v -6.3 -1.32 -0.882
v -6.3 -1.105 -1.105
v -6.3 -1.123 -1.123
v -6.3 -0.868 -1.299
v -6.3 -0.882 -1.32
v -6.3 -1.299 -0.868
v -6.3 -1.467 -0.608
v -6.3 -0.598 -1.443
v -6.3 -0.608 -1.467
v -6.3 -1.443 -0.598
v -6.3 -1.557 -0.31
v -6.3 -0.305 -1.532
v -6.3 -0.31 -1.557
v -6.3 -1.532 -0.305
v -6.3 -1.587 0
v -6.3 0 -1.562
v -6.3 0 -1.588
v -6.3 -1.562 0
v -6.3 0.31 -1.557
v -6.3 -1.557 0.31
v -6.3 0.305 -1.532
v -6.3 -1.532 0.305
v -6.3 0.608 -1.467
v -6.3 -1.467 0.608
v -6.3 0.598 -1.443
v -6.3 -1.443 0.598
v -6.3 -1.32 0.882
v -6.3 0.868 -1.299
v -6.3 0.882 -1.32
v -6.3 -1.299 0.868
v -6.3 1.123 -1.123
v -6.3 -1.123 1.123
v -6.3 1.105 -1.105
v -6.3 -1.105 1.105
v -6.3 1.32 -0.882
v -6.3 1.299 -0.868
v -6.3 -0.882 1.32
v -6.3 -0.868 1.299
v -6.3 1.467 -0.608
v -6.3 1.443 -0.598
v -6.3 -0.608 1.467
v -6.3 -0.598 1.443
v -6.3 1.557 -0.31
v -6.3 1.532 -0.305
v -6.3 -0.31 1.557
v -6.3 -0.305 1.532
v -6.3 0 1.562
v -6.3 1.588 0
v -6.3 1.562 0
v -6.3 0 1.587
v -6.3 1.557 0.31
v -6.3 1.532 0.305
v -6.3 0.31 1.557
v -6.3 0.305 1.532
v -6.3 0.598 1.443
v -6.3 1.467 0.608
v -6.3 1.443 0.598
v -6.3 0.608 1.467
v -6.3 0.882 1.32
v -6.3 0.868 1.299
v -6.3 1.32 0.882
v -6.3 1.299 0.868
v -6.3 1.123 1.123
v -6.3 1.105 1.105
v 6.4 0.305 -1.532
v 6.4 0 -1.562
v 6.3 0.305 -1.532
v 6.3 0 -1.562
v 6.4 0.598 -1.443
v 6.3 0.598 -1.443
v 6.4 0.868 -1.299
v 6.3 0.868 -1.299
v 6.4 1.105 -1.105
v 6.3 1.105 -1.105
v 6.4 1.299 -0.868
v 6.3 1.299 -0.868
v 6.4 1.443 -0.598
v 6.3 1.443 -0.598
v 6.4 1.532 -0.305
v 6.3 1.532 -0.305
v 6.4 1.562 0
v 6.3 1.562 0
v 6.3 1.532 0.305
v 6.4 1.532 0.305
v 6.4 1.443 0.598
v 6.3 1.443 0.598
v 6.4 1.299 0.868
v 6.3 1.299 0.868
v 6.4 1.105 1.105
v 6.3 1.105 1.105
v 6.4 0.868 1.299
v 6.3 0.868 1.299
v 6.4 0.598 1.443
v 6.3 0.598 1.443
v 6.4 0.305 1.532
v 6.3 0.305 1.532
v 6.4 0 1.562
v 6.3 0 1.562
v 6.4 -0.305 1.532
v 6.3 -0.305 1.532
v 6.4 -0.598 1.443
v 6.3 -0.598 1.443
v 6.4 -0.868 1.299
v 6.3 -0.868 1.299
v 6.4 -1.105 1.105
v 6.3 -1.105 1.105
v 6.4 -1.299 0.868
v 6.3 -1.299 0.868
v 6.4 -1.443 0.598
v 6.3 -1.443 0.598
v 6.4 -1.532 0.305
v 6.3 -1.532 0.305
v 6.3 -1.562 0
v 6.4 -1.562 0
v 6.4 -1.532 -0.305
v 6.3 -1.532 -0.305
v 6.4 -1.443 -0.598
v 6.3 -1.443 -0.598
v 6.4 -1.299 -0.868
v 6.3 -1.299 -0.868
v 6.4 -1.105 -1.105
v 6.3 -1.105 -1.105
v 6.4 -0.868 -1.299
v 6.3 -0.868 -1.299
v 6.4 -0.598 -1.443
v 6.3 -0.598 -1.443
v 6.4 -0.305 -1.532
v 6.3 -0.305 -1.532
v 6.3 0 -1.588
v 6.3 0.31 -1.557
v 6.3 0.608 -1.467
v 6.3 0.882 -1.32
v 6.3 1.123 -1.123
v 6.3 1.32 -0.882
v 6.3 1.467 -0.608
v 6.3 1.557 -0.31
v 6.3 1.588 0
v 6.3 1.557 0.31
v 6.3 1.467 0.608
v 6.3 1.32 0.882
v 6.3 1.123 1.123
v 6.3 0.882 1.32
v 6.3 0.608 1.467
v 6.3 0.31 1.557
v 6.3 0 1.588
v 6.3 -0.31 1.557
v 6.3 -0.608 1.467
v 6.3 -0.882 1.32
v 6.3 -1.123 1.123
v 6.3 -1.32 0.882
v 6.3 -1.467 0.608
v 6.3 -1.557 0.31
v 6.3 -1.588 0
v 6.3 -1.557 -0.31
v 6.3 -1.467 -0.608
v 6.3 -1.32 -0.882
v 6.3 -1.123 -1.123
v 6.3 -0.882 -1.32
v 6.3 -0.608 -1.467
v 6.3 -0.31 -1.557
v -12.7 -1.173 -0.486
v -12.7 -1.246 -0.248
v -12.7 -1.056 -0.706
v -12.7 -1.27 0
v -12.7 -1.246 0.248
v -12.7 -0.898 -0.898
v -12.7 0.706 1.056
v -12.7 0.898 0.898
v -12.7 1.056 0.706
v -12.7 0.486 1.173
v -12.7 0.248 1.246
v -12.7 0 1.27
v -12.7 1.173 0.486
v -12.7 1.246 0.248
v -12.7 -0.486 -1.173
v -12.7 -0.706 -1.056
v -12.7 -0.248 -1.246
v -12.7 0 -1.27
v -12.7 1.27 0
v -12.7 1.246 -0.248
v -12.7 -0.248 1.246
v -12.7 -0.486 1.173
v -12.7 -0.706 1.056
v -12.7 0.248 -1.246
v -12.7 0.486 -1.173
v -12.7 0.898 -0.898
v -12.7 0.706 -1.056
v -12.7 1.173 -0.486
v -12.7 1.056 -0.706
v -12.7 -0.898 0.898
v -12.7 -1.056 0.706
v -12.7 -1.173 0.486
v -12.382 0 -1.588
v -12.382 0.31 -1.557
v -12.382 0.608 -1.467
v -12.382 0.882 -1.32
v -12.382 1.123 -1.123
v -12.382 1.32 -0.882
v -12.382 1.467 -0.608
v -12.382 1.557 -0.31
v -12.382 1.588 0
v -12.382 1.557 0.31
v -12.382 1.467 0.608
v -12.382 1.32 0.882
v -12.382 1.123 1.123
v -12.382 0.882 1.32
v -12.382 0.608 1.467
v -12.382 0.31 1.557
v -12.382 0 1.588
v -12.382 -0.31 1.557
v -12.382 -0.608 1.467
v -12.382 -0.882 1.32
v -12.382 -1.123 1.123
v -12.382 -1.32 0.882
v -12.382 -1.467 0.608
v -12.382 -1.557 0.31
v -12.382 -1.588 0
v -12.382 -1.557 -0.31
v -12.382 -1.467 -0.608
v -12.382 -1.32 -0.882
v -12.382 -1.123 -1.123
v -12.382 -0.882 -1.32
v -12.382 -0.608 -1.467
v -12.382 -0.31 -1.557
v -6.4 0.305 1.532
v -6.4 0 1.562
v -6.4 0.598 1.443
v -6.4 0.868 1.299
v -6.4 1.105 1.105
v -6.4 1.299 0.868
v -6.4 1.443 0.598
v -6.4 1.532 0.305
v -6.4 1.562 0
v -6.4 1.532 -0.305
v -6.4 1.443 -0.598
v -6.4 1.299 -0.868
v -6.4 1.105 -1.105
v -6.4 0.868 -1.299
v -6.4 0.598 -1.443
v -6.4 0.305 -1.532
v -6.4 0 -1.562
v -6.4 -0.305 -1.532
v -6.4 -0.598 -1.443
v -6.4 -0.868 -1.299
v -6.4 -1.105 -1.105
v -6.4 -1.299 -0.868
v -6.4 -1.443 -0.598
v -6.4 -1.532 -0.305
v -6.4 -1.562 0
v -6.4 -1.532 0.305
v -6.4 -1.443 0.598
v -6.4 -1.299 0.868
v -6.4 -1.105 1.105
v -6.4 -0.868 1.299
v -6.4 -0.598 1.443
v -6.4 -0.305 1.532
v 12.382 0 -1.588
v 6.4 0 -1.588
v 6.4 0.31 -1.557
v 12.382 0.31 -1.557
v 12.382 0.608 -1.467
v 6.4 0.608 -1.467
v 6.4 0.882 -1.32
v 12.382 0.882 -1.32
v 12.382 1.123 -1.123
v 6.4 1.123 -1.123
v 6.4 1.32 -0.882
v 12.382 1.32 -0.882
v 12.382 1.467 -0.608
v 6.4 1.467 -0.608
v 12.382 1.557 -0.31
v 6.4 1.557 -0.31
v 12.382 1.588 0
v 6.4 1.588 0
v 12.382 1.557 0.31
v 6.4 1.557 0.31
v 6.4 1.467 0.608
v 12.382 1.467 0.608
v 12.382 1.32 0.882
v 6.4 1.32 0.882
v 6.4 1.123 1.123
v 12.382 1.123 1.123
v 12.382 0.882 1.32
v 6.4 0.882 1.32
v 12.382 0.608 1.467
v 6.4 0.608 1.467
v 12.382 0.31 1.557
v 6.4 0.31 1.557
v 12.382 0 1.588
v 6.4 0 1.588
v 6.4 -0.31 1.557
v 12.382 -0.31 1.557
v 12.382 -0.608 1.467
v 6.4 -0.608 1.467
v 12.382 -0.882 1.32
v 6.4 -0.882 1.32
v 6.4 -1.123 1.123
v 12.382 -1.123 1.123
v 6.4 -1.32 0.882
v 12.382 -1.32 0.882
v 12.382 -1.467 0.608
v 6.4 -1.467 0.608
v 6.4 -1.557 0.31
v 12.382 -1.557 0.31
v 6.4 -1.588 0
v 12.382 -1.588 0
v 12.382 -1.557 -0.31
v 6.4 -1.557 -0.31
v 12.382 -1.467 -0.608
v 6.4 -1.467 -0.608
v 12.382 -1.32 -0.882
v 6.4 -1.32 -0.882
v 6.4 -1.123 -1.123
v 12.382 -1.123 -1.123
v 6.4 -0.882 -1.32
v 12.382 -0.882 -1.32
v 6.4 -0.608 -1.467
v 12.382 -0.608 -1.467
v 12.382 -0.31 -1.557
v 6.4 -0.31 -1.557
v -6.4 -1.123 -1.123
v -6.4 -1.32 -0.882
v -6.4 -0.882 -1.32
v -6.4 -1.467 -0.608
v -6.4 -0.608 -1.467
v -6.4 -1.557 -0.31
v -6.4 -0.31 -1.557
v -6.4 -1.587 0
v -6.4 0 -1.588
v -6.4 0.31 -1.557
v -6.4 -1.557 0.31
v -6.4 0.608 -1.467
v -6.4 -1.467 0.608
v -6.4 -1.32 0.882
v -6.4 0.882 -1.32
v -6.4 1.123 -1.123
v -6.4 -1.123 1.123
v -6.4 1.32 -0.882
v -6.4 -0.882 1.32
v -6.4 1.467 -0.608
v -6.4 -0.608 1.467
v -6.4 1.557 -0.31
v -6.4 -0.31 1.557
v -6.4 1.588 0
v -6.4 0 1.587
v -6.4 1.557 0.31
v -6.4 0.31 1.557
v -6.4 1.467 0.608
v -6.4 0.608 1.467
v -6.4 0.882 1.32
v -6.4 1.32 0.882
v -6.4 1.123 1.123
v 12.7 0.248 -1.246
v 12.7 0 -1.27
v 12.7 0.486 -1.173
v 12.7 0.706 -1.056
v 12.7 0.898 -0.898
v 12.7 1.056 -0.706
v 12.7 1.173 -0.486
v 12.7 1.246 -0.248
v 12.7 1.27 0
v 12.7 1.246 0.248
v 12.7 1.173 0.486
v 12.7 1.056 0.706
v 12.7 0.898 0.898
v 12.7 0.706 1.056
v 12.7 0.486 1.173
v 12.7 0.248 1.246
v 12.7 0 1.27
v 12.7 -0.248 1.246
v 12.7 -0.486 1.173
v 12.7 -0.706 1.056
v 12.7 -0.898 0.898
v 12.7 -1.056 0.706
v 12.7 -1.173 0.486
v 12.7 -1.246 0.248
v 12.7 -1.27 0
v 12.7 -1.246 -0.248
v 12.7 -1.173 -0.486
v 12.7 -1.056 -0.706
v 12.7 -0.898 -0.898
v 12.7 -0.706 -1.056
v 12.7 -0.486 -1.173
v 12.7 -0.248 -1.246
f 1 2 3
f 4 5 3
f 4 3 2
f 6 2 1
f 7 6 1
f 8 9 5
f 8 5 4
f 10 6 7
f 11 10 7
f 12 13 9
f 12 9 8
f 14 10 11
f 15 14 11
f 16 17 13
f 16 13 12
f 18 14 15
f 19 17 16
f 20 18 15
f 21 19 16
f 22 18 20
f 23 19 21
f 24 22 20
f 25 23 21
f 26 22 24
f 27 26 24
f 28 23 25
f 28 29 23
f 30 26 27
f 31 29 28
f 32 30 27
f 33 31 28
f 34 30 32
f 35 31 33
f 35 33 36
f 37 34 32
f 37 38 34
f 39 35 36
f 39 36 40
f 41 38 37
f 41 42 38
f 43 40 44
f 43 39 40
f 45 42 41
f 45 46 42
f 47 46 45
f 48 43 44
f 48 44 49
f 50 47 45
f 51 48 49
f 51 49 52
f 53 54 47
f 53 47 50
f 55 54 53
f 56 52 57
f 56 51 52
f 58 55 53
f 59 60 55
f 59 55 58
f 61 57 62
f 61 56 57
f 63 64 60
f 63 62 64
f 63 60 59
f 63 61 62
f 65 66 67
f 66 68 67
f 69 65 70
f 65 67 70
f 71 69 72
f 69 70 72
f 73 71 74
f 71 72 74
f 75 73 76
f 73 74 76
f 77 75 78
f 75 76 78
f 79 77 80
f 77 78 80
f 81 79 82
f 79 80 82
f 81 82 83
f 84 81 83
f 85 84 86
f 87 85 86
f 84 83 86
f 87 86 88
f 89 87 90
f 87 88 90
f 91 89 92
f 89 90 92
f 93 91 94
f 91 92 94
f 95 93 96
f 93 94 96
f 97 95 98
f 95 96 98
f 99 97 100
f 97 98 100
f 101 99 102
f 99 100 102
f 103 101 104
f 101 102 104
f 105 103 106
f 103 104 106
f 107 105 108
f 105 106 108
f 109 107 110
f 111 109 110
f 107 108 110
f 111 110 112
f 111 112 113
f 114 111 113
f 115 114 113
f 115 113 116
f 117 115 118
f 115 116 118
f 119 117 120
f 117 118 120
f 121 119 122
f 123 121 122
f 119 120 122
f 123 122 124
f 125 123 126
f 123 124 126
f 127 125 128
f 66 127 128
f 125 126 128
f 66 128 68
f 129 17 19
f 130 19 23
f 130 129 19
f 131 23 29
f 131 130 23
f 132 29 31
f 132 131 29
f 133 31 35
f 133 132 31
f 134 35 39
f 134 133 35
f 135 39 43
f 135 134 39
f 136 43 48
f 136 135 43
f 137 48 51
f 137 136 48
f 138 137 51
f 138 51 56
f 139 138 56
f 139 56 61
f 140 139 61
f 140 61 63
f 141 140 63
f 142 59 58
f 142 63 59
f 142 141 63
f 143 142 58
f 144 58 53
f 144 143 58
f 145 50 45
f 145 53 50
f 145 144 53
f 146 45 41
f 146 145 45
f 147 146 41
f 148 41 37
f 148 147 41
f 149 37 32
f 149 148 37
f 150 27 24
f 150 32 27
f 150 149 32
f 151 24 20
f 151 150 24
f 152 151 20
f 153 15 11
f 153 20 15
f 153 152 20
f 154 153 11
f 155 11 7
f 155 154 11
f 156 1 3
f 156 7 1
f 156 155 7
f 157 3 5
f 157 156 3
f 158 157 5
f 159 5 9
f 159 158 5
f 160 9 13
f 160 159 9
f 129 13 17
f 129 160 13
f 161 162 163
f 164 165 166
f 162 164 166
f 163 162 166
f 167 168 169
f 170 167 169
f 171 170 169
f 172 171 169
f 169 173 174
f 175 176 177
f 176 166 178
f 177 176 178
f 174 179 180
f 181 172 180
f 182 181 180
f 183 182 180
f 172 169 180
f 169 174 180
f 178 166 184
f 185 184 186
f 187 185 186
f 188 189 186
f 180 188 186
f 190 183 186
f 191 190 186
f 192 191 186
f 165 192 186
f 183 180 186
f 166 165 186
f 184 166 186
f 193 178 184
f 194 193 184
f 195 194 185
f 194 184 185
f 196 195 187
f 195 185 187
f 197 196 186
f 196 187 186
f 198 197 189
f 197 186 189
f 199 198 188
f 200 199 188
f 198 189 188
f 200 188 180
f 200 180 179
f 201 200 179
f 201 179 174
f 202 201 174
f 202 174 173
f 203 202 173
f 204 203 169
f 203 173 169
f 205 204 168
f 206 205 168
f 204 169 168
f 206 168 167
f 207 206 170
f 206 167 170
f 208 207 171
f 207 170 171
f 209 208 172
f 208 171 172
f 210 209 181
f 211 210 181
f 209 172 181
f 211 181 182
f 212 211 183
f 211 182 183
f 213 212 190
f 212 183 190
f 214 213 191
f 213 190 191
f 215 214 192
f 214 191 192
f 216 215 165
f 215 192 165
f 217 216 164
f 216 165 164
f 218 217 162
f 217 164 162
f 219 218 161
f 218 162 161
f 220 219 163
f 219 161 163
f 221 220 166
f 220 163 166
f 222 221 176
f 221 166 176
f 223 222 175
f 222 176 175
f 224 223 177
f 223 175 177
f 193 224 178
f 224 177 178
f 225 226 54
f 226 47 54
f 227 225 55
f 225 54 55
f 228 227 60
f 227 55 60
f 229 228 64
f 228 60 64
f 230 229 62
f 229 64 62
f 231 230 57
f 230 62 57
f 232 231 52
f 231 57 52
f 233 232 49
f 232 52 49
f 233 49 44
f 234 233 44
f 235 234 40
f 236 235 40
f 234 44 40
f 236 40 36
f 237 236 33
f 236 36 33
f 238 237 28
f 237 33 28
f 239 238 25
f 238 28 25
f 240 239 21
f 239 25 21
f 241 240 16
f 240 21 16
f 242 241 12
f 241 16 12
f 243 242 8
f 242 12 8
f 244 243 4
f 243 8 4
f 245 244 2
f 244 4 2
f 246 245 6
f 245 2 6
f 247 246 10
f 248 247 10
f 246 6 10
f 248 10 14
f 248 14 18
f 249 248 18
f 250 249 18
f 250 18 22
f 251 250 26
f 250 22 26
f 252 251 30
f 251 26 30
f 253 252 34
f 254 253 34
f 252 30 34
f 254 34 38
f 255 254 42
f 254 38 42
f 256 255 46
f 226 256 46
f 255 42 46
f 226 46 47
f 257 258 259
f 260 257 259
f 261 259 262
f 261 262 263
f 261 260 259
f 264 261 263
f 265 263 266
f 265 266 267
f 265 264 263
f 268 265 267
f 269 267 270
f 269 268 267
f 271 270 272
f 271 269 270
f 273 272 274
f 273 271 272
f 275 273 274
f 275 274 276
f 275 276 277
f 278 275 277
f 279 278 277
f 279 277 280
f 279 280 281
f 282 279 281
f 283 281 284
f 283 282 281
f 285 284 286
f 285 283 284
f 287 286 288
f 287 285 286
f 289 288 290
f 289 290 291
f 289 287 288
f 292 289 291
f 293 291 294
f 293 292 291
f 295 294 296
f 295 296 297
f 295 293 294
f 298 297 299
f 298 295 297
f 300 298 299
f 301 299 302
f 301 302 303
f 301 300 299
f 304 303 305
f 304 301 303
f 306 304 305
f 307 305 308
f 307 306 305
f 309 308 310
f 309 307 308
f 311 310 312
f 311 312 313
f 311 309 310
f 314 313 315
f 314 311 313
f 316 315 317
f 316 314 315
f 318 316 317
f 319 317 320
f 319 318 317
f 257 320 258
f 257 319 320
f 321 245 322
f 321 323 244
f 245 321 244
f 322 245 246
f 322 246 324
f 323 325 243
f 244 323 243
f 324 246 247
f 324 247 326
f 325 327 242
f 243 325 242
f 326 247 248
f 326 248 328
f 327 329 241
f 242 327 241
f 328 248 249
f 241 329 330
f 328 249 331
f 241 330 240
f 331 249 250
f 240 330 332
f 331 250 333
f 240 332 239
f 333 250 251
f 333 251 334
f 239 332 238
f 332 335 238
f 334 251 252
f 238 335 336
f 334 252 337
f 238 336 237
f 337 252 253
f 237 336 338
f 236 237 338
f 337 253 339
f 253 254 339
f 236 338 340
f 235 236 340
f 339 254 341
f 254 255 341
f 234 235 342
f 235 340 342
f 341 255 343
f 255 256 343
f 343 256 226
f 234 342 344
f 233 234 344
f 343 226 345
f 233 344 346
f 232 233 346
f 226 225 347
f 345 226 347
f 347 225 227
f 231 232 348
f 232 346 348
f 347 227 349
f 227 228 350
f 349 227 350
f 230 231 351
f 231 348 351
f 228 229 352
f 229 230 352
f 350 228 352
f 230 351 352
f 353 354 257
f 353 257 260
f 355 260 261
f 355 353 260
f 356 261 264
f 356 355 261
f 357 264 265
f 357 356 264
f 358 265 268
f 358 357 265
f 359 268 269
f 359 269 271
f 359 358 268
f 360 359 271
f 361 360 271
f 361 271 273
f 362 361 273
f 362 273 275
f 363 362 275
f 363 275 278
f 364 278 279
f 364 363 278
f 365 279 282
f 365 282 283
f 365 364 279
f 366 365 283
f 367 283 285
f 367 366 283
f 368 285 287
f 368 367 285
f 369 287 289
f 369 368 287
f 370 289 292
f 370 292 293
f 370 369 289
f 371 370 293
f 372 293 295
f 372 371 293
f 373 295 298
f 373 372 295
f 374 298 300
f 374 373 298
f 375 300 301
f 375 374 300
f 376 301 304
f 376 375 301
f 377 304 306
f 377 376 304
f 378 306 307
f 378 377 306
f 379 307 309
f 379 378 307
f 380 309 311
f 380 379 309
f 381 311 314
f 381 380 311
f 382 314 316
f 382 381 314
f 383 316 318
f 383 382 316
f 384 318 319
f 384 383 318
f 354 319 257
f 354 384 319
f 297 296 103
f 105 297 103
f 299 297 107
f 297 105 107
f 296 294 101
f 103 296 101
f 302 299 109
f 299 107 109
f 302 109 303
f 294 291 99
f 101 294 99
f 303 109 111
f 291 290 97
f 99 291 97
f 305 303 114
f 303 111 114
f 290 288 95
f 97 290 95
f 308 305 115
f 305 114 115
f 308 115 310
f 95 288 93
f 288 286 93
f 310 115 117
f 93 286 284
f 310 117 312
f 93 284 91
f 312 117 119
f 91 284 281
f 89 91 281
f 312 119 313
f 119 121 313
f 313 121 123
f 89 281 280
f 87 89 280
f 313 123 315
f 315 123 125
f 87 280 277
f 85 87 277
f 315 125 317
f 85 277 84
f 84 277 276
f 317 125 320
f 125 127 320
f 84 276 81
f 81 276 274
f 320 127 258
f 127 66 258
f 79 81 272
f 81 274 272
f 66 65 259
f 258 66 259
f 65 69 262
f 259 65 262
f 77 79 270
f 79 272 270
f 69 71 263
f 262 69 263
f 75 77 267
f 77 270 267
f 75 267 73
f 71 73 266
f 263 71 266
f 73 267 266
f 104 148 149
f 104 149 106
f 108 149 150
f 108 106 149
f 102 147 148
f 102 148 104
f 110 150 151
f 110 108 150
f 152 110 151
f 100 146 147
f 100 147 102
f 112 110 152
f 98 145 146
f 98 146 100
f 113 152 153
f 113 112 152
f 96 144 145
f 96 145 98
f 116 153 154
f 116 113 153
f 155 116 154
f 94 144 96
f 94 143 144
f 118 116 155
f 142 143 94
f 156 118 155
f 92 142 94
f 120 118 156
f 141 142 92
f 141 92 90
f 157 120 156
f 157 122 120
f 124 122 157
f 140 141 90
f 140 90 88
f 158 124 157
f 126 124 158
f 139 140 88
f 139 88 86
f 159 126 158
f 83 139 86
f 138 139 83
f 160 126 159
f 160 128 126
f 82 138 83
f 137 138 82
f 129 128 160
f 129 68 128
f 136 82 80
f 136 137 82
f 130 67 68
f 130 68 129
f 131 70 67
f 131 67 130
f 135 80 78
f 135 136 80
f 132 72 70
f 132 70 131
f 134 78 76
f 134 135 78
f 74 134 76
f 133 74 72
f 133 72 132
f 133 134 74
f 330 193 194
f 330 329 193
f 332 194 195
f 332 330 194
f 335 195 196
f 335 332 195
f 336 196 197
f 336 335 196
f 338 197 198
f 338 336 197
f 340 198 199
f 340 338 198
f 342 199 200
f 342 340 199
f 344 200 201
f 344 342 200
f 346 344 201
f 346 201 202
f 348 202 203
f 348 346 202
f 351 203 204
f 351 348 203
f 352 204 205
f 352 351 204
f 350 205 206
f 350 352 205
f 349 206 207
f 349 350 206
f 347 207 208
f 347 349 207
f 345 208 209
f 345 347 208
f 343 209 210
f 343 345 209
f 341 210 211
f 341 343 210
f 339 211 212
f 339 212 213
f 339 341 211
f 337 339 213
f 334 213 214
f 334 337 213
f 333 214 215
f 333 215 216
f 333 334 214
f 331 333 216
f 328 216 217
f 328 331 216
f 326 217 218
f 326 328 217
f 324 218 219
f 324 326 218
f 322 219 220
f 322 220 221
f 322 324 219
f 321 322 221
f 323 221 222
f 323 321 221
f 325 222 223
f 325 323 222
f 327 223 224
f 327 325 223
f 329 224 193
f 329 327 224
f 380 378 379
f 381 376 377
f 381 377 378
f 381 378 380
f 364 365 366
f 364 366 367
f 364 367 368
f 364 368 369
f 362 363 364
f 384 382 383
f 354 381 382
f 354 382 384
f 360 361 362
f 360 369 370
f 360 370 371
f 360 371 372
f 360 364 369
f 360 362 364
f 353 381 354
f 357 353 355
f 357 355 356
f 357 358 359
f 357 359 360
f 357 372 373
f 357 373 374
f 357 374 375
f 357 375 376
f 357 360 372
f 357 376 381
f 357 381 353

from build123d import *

# Parameters (mm, degrees)
SKETCH2_R           = 1.5875
EXTRUDE1_DEPTH      = 12.7
EXTRUDE1_DEPTH_BACK = 12.7
CHAMFER1_SIZE       = 0.3175
SKETCH4_R           = 1.5875
SKETCH4_R_2         = 1.5621
CUT_EXTRUDE2_DEPTH  = 0.05
SKETCH5_R           = 1.5875
SKETCH5_R_2         = 1.5621
CUT_EXTRUDE3_DEPTH  = 0.05


with BuildPart() as part:
    # Sketch2 → Extrude1 (new body, two sides)
    with BuildSketch(Plane(origin=(0, 0, 0), x_dir=(0, 0, -1), z_dir=(1, 0, 0))) as extrude1_sk:
        Circle(SKETCH2_R)
    extrude(amount=EXTRUDE1_DEPTH)
    extrude(extrude1_sk.sketch, amount=-EXTRUDE1_DEPTH_BACK)

    # Chamfer1
    chamfer1_edges = [part.edges().sort_by_distance(p)[0] for p in [
        (-12.7, 0, 1.5875),
        (12.7, 0, 1.5875),
    ]]
    chamfer(chamfer1_edges, length=CHAMFER1_SIZE)

    # Sketch4 → Cut-Extrude2 (cut, symmetric)
    with BuildSketch(Plane.ZY.offset(6.35)):
        Circle(SKETCH4_R)
        Circle(SKETCH4_R_2, mode=Mode.SUBTRACT)
    extrude(amount=CUT_EXTRUDE2_DEPTH, both=True, mode=Mode.SUBTRACT)

    # Sketch5 → Cut-Extrude3 (cut, symmetric)
    with BuildSketch(Plane(origin=(6.35, 0, 0), x_dir=(0, 0, -1), z_dir=(1, 0, 0))):
        Circle(SKETCH5_R)
        Circle(SKETCH5_R_2, mode=Mode.SUBTRACT)
    extrude(amount=CUT_EXTRUDE3_DEPTH, both=True, mode=Mode.SUBTRACT)


solid = part.part
